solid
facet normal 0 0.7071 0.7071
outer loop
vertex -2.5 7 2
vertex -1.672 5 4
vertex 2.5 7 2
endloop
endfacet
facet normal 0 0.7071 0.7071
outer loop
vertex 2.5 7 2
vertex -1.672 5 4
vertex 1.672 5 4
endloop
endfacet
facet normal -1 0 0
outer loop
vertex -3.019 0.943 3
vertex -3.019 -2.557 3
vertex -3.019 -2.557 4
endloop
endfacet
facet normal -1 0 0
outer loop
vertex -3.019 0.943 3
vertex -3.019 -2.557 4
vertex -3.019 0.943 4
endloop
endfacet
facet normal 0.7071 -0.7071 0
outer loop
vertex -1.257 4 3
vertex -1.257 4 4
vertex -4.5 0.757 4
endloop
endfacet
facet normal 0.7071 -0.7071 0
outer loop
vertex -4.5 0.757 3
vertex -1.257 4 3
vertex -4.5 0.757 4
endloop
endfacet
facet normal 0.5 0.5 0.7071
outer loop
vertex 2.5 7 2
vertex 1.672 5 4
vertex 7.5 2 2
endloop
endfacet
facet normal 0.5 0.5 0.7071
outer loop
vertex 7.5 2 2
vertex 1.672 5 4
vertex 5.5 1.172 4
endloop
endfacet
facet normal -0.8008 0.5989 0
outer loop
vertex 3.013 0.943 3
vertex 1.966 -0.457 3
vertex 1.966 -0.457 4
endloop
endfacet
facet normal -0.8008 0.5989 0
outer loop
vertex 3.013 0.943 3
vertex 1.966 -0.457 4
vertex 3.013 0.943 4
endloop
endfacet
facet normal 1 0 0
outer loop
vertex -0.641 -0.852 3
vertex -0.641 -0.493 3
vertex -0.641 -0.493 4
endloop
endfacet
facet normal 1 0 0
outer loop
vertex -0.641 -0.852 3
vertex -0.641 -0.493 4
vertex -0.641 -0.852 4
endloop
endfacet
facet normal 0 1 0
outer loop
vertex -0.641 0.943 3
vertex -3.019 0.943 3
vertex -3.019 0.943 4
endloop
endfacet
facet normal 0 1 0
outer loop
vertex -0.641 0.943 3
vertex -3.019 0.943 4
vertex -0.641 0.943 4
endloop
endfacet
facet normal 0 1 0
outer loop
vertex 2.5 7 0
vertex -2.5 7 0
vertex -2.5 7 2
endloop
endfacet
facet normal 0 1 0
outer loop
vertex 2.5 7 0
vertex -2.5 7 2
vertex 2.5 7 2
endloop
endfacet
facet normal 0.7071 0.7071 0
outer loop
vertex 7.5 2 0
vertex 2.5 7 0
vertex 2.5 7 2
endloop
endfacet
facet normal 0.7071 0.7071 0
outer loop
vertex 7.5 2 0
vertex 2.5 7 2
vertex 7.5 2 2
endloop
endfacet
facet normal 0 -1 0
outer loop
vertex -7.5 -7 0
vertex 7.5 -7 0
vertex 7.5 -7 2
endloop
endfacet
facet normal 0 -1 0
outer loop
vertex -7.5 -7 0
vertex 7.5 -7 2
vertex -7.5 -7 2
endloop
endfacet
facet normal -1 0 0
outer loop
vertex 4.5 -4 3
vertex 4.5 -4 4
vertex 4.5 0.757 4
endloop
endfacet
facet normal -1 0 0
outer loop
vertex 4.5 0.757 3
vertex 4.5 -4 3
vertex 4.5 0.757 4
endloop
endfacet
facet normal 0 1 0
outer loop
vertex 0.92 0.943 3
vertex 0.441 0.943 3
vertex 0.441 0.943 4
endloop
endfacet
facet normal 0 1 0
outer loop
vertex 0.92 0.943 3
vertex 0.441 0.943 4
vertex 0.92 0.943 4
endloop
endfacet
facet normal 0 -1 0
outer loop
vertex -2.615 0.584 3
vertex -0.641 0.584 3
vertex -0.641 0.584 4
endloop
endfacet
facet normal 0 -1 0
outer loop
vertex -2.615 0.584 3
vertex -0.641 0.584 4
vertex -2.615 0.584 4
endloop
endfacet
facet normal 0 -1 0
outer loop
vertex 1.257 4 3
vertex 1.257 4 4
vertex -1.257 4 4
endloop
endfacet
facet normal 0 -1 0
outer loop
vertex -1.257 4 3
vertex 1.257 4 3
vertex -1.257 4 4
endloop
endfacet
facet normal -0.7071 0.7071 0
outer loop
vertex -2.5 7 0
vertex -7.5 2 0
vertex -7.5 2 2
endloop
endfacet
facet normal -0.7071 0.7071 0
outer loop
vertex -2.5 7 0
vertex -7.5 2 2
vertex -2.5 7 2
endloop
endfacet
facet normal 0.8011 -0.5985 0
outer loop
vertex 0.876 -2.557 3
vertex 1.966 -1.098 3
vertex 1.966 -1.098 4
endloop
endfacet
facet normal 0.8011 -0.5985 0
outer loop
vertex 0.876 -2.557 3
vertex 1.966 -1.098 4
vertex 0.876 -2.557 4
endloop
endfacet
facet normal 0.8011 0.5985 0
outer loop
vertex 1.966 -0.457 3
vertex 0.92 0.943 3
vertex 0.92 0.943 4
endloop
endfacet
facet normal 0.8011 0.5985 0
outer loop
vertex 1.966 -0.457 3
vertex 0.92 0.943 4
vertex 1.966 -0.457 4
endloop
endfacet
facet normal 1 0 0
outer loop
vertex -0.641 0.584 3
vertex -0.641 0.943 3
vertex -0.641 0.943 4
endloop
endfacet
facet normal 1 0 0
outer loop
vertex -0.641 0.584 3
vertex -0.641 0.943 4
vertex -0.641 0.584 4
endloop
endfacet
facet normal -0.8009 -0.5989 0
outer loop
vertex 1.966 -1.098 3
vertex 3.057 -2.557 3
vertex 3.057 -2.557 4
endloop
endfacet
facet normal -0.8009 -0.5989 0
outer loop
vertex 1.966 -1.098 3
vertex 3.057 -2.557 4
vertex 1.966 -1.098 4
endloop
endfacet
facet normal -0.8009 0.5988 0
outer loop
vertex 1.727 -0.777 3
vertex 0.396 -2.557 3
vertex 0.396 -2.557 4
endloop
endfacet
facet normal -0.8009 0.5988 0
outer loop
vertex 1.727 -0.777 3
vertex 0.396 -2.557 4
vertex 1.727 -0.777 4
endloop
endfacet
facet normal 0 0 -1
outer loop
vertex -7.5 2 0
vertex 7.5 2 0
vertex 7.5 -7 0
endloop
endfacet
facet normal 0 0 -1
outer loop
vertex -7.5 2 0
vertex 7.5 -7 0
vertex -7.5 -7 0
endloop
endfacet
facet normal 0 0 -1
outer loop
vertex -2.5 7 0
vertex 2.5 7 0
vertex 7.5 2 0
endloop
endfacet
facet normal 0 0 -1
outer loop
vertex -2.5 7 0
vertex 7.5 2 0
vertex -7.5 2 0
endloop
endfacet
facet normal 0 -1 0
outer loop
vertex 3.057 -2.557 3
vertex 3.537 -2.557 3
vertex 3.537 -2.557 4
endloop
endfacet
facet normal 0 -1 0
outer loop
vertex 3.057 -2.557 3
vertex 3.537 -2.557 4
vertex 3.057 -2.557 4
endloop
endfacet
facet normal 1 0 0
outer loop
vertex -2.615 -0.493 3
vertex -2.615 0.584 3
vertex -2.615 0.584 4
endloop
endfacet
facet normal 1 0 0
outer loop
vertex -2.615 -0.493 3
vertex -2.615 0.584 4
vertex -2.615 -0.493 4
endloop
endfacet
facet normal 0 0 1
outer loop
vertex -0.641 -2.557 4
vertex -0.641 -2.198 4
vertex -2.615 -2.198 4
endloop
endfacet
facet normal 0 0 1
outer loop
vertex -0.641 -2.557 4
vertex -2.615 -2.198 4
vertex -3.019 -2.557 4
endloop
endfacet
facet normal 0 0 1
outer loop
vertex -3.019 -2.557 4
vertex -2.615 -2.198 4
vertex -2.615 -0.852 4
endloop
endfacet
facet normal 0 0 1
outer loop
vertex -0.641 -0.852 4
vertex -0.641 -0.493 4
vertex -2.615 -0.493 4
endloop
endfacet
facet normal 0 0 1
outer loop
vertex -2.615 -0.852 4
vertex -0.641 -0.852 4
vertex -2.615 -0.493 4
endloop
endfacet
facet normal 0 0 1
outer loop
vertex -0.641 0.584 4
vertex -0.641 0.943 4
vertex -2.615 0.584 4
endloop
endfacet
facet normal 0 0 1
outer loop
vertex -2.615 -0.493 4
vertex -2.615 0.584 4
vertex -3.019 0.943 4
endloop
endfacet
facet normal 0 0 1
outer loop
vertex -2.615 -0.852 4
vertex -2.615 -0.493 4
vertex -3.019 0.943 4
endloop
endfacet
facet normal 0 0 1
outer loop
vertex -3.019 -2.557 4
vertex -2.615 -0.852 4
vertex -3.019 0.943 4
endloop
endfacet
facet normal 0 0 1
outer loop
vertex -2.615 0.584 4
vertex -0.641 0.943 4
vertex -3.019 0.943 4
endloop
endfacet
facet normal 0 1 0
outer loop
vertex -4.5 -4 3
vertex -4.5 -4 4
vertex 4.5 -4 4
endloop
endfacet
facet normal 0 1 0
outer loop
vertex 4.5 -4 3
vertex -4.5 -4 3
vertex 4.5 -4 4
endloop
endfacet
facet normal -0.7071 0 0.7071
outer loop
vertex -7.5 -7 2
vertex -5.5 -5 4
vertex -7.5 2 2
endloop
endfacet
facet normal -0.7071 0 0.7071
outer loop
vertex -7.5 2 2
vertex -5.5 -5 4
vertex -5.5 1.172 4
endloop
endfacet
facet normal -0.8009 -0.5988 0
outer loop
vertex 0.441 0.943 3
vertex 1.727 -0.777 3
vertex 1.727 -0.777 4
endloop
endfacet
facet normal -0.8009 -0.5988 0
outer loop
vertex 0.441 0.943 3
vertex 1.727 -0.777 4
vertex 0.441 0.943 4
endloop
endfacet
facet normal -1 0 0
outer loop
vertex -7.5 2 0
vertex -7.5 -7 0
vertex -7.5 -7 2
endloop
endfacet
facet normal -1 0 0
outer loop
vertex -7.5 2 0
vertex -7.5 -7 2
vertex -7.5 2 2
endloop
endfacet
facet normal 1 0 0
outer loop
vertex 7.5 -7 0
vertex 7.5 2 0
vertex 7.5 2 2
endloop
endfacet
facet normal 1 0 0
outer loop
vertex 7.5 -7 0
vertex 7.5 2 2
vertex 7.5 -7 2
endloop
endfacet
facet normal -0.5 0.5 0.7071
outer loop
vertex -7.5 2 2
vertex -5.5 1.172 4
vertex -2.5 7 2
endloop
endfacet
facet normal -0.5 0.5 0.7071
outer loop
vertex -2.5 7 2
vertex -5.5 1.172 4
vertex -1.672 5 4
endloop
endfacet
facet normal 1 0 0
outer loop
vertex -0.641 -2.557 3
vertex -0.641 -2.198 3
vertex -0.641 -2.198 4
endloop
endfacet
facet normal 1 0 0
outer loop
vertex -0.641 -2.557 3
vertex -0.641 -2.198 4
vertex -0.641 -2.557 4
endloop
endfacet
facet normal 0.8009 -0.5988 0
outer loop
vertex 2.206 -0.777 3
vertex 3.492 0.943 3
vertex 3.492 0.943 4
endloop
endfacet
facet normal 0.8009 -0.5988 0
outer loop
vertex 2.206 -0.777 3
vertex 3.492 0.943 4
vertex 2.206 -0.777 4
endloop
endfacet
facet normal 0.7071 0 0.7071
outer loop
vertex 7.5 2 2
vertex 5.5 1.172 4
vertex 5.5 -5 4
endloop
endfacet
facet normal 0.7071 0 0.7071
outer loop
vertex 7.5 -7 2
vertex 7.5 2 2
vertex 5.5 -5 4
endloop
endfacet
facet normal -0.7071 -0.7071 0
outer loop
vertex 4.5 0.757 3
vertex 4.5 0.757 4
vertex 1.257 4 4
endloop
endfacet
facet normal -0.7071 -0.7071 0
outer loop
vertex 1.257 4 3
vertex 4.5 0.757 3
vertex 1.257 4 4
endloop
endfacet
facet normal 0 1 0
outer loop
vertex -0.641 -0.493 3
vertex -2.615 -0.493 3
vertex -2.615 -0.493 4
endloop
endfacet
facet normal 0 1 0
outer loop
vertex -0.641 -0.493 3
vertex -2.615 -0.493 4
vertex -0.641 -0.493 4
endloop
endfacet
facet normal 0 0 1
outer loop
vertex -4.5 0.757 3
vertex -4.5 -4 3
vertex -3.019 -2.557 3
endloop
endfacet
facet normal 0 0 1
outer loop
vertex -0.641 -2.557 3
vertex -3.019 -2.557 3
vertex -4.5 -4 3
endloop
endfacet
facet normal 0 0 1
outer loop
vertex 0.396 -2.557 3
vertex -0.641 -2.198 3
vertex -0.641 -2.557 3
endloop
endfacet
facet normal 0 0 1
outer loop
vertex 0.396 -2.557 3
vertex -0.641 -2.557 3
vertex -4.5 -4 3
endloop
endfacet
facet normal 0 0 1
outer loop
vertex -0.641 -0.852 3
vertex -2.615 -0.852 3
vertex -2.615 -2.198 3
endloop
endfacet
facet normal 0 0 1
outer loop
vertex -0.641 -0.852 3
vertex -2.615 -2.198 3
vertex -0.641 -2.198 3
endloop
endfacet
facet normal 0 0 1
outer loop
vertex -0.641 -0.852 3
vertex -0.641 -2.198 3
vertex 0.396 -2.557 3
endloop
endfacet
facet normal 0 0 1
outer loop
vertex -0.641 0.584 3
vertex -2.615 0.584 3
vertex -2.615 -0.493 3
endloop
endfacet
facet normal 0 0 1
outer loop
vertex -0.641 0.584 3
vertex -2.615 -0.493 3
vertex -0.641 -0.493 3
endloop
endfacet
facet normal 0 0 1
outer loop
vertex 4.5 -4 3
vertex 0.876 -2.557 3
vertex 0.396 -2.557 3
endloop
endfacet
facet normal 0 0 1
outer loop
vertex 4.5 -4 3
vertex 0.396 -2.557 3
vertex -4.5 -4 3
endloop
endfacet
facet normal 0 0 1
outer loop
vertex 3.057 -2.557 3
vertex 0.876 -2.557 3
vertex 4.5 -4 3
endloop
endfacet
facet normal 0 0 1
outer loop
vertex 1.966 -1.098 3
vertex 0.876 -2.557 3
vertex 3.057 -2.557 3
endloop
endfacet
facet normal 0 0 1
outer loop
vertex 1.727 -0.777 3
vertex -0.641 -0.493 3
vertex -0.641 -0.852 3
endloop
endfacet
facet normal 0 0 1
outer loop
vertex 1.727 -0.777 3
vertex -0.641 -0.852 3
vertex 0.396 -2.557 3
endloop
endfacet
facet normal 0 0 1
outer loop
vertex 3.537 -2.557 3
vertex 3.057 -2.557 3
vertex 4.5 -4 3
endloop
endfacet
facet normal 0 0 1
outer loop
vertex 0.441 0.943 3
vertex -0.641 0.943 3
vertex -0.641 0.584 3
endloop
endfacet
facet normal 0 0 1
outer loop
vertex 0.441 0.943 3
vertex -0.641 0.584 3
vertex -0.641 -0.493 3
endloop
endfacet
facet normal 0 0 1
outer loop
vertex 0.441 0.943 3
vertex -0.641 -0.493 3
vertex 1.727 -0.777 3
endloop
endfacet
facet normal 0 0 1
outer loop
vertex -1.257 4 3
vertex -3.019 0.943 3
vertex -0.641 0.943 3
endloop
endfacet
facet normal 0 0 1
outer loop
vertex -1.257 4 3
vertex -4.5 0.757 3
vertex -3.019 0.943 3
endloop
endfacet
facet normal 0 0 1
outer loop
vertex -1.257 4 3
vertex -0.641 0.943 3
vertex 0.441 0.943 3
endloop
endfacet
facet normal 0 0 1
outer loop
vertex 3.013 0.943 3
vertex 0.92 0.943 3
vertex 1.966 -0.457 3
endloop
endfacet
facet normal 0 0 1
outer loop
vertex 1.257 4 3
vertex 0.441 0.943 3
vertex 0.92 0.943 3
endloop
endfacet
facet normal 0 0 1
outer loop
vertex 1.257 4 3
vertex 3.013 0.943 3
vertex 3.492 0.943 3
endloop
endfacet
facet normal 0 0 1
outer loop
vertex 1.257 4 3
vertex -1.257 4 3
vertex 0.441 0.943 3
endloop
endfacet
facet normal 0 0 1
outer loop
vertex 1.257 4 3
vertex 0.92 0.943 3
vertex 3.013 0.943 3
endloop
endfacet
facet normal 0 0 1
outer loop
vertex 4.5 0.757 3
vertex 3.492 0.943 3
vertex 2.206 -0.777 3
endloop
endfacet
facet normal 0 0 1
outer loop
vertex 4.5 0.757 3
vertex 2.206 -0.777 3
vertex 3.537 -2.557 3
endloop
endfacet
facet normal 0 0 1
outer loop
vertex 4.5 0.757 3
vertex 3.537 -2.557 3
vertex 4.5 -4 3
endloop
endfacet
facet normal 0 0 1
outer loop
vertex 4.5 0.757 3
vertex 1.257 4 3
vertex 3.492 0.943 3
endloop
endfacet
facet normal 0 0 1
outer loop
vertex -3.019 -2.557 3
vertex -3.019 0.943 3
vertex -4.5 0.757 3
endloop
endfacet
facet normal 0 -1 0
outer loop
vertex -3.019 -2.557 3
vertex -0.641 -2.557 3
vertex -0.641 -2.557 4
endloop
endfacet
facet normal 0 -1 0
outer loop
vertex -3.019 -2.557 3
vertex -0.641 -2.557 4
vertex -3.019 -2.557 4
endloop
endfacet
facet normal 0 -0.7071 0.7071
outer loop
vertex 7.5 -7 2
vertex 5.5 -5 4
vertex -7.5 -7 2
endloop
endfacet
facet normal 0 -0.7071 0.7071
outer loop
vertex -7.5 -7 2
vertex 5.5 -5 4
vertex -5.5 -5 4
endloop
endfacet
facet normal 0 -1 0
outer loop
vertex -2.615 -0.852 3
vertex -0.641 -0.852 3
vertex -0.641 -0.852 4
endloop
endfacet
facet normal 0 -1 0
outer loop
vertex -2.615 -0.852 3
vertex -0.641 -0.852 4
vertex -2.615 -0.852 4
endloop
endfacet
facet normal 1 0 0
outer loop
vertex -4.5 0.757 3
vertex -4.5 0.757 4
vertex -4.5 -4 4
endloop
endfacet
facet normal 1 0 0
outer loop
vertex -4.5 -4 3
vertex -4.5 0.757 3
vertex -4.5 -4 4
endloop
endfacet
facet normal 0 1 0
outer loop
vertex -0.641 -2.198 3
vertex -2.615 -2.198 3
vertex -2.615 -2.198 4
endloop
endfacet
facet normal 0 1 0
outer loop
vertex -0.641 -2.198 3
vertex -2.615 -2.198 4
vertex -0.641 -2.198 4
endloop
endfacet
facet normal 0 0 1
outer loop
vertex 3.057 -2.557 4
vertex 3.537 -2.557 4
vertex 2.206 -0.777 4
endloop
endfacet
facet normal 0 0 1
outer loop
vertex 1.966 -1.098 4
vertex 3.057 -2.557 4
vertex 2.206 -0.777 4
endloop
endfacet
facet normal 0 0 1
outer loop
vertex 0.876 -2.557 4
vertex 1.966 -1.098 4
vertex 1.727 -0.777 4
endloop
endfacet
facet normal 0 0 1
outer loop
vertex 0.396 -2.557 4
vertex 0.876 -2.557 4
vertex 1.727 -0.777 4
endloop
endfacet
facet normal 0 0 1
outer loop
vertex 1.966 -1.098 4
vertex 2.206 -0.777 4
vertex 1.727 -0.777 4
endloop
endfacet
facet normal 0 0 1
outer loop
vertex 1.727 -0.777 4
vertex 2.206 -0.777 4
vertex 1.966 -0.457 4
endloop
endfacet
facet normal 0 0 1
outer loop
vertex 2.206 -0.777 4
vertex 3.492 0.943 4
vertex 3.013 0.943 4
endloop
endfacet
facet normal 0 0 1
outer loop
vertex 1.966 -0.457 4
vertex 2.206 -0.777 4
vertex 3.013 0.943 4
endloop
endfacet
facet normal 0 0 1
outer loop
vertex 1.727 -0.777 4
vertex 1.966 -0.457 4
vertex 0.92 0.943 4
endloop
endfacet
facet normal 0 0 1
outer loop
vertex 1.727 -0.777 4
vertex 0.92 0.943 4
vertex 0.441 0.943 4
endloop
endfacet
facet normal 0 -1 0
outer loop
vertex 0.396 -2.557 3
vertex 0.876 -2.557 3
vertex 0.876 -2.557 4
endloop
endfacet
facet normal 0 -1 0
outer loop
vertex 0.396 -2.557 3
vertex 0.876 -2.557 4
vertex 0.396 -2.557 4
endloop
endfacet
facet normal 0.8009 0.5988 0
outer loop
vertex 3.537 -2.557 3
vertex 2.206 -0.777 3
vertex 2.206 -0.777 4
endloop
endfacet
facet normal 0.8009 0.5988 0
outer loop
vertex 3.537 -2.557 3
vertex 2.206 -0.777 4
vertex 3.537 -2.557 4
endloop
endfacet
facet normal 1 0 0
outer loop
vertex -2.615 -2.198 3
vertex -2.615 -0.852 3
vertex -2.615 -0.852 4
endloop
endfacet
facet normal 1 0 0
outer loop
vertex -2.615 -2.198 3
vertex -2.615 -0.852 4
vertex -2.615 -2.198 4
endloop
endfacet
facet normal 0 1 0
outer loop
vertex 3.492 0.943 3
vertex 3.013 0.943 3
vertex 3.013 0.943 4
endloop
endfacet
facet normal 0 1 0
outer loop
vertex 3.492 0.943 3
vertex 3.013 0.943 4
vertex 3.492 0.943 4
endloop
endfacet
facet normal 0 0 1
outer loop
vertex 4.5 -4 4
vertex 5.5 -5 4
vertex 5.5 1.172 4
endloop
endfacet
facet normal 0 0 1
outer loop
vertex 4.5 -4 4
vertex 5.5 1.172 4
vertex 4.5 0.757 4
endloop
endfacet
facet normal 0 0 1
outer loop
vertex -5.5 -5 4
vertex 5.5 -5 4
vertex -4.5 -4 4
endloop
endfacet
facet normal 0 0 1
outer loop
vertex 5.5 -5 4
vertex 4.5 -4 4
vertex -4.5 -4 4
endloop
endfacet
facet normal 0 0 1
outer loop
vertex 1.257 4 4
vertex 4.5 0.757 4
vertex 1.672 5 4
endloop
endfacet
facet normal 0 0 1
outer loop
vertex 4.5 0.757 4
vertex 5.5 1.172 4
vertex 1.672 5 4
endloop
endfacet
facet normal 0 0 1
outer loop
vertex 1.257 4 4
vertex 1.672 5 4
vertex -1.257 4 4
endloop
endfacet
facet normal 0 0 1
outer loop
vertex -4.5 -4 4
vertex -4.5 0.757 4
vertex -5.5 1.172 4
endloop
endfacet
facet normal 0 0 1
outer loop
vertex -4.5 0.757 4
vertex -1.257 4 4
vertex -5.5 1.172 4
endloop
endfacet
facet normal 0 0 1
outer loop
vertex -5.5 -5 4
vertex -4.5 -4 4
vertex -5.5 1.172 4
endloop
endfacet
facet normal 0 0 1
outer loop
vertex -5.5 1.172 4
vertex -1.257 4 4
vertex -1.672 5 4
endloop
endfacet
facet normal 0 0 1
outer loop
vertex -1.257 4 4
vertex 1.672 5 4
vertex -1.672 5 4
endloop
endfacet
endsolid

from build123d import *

# Parameters (mm, degrees)
EXTRUDE_1_DEPTH     = 4
CHAMFER_1_SIZE      = 2
CUT_EXTRUDE_1_DEPTH = 1
EXTRUDE_2_DEPTH     = 1


with BuildPart() as part:
    # 草图1 → 凸台-拉伸1 (new body)
    with BuildSketch(Plane.XY):
        Polygon((-7.5, 2), (-2.5, 7), (2.5, 7), (7.5, 2), (7.5, -7), (-7.5, -7), align=None)
    extrude(amount=EXTRUDE_1_DEPTH)

    # 倒角1
    chamfer_1_edges = [part.edges().sort_by_distance(p)[0] for p in [
        (7.5, -2.5, 4),
        (5, 4.5, 4),
        (0, 7, 4),
        (-5, 4.5, 4),
        (-7.5, -2.5, 4),
        (0, -7, 4),
    ]]
    chamfer(chamfer_1_edges, length=CHAMFER_1_SIZE)

    # 草图2 → 切除-拉伸1 (cut)
    with BuildSketch(Plane.XY.offset(4)):
        Polygon((-4.5, -4), (4.5, -4), (4.5, 0.757359313), (1.257359313, 4), (-1.257359313, 4), (-4.5, 0.757359313), align=None)
    extrude(amount=-CUT_EXTRUDE_1_DEPTH, mode=Mode.SUBTRACT)

    # 草图3 → 凸台-拉伸2 (add)
    with BuildSketch(Plane.XY.offset(3)):
        Polygon((-3.018784833, 0.942914113), (-0.640579705, 0.942914113), (-0.640579705, 0.583939754), (-2.614938679, 0.583939754), (-2.614938679, -0.492983323), (-0.640579705, -0.492983323), (-0.640579705, -0.851957682), (-2.614938679, -0.851957682), (-2.614938679, -2.198111528), (-0.640579705, -2.198111528), (-0.640579705, -2.557085887), (-3.018784833, -2.557085887), align=None)
        Polygon((0.440830551, 0.942914113), (0.920397859, 0.942914113), (1.966471577, -0.45652499), (3.012545295, 0.942914113), (3.492112603, 0.942914113), (2.206255231, -0.77693765), (3.536984397, -2.557085887), (3.05741709, -2.557085887), (1.966471577, -1.098051432), (0.875526064, -2.557085887), (0.395958756, -2.557085887), (1.726687923, -0.77693765), align=None)
    extrude(amount=EXTRUDE_2_DEPTH)


solid = part.part
